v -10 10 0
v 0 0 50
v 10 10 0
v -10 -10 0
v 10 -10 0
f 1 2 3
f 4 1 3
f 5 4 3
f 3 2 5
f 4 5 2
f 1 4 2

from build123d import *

# Parameters (mm, degrees)
F0_W     = 20
F0_H     = 20
F1_DEPTH = 50
F3_DEPTH = 25
F5_DEPTH = 12.5


with BuildPart() as f1:
    # F0 (on Top) → F1 (new body)
    with BuildSketch(Plane.XY):
        Rectangle(F0_W, F0_H)
    extrude(amount=F1_DEPTH)

    # F2 (on face) → F3 (cut)
    with BuildSketch(Plane.XZ.offset(10)):
        Polygon((-10, 50), (-10, 0), (0, 50), align=None)
        Polygon((0, 50), (10, 0), (10, 50), align=None)
    extrude(amount=-F3_DEPTH, mode=Mode.SUBTRACT)

    # F4 (on Right) → F5 (cut, symmetric)
    with BuildSketch(Plane.YZ):
        Polygon((0, 50), (10, 0), (10, 50), align=None)
        Polygon((-10, 50), (-10, 0), (0, 50), align=None)
    extrude(amount=F5_DEPTH, both=True, mode=Mode.SUBTRACT)


solid = f1.part
